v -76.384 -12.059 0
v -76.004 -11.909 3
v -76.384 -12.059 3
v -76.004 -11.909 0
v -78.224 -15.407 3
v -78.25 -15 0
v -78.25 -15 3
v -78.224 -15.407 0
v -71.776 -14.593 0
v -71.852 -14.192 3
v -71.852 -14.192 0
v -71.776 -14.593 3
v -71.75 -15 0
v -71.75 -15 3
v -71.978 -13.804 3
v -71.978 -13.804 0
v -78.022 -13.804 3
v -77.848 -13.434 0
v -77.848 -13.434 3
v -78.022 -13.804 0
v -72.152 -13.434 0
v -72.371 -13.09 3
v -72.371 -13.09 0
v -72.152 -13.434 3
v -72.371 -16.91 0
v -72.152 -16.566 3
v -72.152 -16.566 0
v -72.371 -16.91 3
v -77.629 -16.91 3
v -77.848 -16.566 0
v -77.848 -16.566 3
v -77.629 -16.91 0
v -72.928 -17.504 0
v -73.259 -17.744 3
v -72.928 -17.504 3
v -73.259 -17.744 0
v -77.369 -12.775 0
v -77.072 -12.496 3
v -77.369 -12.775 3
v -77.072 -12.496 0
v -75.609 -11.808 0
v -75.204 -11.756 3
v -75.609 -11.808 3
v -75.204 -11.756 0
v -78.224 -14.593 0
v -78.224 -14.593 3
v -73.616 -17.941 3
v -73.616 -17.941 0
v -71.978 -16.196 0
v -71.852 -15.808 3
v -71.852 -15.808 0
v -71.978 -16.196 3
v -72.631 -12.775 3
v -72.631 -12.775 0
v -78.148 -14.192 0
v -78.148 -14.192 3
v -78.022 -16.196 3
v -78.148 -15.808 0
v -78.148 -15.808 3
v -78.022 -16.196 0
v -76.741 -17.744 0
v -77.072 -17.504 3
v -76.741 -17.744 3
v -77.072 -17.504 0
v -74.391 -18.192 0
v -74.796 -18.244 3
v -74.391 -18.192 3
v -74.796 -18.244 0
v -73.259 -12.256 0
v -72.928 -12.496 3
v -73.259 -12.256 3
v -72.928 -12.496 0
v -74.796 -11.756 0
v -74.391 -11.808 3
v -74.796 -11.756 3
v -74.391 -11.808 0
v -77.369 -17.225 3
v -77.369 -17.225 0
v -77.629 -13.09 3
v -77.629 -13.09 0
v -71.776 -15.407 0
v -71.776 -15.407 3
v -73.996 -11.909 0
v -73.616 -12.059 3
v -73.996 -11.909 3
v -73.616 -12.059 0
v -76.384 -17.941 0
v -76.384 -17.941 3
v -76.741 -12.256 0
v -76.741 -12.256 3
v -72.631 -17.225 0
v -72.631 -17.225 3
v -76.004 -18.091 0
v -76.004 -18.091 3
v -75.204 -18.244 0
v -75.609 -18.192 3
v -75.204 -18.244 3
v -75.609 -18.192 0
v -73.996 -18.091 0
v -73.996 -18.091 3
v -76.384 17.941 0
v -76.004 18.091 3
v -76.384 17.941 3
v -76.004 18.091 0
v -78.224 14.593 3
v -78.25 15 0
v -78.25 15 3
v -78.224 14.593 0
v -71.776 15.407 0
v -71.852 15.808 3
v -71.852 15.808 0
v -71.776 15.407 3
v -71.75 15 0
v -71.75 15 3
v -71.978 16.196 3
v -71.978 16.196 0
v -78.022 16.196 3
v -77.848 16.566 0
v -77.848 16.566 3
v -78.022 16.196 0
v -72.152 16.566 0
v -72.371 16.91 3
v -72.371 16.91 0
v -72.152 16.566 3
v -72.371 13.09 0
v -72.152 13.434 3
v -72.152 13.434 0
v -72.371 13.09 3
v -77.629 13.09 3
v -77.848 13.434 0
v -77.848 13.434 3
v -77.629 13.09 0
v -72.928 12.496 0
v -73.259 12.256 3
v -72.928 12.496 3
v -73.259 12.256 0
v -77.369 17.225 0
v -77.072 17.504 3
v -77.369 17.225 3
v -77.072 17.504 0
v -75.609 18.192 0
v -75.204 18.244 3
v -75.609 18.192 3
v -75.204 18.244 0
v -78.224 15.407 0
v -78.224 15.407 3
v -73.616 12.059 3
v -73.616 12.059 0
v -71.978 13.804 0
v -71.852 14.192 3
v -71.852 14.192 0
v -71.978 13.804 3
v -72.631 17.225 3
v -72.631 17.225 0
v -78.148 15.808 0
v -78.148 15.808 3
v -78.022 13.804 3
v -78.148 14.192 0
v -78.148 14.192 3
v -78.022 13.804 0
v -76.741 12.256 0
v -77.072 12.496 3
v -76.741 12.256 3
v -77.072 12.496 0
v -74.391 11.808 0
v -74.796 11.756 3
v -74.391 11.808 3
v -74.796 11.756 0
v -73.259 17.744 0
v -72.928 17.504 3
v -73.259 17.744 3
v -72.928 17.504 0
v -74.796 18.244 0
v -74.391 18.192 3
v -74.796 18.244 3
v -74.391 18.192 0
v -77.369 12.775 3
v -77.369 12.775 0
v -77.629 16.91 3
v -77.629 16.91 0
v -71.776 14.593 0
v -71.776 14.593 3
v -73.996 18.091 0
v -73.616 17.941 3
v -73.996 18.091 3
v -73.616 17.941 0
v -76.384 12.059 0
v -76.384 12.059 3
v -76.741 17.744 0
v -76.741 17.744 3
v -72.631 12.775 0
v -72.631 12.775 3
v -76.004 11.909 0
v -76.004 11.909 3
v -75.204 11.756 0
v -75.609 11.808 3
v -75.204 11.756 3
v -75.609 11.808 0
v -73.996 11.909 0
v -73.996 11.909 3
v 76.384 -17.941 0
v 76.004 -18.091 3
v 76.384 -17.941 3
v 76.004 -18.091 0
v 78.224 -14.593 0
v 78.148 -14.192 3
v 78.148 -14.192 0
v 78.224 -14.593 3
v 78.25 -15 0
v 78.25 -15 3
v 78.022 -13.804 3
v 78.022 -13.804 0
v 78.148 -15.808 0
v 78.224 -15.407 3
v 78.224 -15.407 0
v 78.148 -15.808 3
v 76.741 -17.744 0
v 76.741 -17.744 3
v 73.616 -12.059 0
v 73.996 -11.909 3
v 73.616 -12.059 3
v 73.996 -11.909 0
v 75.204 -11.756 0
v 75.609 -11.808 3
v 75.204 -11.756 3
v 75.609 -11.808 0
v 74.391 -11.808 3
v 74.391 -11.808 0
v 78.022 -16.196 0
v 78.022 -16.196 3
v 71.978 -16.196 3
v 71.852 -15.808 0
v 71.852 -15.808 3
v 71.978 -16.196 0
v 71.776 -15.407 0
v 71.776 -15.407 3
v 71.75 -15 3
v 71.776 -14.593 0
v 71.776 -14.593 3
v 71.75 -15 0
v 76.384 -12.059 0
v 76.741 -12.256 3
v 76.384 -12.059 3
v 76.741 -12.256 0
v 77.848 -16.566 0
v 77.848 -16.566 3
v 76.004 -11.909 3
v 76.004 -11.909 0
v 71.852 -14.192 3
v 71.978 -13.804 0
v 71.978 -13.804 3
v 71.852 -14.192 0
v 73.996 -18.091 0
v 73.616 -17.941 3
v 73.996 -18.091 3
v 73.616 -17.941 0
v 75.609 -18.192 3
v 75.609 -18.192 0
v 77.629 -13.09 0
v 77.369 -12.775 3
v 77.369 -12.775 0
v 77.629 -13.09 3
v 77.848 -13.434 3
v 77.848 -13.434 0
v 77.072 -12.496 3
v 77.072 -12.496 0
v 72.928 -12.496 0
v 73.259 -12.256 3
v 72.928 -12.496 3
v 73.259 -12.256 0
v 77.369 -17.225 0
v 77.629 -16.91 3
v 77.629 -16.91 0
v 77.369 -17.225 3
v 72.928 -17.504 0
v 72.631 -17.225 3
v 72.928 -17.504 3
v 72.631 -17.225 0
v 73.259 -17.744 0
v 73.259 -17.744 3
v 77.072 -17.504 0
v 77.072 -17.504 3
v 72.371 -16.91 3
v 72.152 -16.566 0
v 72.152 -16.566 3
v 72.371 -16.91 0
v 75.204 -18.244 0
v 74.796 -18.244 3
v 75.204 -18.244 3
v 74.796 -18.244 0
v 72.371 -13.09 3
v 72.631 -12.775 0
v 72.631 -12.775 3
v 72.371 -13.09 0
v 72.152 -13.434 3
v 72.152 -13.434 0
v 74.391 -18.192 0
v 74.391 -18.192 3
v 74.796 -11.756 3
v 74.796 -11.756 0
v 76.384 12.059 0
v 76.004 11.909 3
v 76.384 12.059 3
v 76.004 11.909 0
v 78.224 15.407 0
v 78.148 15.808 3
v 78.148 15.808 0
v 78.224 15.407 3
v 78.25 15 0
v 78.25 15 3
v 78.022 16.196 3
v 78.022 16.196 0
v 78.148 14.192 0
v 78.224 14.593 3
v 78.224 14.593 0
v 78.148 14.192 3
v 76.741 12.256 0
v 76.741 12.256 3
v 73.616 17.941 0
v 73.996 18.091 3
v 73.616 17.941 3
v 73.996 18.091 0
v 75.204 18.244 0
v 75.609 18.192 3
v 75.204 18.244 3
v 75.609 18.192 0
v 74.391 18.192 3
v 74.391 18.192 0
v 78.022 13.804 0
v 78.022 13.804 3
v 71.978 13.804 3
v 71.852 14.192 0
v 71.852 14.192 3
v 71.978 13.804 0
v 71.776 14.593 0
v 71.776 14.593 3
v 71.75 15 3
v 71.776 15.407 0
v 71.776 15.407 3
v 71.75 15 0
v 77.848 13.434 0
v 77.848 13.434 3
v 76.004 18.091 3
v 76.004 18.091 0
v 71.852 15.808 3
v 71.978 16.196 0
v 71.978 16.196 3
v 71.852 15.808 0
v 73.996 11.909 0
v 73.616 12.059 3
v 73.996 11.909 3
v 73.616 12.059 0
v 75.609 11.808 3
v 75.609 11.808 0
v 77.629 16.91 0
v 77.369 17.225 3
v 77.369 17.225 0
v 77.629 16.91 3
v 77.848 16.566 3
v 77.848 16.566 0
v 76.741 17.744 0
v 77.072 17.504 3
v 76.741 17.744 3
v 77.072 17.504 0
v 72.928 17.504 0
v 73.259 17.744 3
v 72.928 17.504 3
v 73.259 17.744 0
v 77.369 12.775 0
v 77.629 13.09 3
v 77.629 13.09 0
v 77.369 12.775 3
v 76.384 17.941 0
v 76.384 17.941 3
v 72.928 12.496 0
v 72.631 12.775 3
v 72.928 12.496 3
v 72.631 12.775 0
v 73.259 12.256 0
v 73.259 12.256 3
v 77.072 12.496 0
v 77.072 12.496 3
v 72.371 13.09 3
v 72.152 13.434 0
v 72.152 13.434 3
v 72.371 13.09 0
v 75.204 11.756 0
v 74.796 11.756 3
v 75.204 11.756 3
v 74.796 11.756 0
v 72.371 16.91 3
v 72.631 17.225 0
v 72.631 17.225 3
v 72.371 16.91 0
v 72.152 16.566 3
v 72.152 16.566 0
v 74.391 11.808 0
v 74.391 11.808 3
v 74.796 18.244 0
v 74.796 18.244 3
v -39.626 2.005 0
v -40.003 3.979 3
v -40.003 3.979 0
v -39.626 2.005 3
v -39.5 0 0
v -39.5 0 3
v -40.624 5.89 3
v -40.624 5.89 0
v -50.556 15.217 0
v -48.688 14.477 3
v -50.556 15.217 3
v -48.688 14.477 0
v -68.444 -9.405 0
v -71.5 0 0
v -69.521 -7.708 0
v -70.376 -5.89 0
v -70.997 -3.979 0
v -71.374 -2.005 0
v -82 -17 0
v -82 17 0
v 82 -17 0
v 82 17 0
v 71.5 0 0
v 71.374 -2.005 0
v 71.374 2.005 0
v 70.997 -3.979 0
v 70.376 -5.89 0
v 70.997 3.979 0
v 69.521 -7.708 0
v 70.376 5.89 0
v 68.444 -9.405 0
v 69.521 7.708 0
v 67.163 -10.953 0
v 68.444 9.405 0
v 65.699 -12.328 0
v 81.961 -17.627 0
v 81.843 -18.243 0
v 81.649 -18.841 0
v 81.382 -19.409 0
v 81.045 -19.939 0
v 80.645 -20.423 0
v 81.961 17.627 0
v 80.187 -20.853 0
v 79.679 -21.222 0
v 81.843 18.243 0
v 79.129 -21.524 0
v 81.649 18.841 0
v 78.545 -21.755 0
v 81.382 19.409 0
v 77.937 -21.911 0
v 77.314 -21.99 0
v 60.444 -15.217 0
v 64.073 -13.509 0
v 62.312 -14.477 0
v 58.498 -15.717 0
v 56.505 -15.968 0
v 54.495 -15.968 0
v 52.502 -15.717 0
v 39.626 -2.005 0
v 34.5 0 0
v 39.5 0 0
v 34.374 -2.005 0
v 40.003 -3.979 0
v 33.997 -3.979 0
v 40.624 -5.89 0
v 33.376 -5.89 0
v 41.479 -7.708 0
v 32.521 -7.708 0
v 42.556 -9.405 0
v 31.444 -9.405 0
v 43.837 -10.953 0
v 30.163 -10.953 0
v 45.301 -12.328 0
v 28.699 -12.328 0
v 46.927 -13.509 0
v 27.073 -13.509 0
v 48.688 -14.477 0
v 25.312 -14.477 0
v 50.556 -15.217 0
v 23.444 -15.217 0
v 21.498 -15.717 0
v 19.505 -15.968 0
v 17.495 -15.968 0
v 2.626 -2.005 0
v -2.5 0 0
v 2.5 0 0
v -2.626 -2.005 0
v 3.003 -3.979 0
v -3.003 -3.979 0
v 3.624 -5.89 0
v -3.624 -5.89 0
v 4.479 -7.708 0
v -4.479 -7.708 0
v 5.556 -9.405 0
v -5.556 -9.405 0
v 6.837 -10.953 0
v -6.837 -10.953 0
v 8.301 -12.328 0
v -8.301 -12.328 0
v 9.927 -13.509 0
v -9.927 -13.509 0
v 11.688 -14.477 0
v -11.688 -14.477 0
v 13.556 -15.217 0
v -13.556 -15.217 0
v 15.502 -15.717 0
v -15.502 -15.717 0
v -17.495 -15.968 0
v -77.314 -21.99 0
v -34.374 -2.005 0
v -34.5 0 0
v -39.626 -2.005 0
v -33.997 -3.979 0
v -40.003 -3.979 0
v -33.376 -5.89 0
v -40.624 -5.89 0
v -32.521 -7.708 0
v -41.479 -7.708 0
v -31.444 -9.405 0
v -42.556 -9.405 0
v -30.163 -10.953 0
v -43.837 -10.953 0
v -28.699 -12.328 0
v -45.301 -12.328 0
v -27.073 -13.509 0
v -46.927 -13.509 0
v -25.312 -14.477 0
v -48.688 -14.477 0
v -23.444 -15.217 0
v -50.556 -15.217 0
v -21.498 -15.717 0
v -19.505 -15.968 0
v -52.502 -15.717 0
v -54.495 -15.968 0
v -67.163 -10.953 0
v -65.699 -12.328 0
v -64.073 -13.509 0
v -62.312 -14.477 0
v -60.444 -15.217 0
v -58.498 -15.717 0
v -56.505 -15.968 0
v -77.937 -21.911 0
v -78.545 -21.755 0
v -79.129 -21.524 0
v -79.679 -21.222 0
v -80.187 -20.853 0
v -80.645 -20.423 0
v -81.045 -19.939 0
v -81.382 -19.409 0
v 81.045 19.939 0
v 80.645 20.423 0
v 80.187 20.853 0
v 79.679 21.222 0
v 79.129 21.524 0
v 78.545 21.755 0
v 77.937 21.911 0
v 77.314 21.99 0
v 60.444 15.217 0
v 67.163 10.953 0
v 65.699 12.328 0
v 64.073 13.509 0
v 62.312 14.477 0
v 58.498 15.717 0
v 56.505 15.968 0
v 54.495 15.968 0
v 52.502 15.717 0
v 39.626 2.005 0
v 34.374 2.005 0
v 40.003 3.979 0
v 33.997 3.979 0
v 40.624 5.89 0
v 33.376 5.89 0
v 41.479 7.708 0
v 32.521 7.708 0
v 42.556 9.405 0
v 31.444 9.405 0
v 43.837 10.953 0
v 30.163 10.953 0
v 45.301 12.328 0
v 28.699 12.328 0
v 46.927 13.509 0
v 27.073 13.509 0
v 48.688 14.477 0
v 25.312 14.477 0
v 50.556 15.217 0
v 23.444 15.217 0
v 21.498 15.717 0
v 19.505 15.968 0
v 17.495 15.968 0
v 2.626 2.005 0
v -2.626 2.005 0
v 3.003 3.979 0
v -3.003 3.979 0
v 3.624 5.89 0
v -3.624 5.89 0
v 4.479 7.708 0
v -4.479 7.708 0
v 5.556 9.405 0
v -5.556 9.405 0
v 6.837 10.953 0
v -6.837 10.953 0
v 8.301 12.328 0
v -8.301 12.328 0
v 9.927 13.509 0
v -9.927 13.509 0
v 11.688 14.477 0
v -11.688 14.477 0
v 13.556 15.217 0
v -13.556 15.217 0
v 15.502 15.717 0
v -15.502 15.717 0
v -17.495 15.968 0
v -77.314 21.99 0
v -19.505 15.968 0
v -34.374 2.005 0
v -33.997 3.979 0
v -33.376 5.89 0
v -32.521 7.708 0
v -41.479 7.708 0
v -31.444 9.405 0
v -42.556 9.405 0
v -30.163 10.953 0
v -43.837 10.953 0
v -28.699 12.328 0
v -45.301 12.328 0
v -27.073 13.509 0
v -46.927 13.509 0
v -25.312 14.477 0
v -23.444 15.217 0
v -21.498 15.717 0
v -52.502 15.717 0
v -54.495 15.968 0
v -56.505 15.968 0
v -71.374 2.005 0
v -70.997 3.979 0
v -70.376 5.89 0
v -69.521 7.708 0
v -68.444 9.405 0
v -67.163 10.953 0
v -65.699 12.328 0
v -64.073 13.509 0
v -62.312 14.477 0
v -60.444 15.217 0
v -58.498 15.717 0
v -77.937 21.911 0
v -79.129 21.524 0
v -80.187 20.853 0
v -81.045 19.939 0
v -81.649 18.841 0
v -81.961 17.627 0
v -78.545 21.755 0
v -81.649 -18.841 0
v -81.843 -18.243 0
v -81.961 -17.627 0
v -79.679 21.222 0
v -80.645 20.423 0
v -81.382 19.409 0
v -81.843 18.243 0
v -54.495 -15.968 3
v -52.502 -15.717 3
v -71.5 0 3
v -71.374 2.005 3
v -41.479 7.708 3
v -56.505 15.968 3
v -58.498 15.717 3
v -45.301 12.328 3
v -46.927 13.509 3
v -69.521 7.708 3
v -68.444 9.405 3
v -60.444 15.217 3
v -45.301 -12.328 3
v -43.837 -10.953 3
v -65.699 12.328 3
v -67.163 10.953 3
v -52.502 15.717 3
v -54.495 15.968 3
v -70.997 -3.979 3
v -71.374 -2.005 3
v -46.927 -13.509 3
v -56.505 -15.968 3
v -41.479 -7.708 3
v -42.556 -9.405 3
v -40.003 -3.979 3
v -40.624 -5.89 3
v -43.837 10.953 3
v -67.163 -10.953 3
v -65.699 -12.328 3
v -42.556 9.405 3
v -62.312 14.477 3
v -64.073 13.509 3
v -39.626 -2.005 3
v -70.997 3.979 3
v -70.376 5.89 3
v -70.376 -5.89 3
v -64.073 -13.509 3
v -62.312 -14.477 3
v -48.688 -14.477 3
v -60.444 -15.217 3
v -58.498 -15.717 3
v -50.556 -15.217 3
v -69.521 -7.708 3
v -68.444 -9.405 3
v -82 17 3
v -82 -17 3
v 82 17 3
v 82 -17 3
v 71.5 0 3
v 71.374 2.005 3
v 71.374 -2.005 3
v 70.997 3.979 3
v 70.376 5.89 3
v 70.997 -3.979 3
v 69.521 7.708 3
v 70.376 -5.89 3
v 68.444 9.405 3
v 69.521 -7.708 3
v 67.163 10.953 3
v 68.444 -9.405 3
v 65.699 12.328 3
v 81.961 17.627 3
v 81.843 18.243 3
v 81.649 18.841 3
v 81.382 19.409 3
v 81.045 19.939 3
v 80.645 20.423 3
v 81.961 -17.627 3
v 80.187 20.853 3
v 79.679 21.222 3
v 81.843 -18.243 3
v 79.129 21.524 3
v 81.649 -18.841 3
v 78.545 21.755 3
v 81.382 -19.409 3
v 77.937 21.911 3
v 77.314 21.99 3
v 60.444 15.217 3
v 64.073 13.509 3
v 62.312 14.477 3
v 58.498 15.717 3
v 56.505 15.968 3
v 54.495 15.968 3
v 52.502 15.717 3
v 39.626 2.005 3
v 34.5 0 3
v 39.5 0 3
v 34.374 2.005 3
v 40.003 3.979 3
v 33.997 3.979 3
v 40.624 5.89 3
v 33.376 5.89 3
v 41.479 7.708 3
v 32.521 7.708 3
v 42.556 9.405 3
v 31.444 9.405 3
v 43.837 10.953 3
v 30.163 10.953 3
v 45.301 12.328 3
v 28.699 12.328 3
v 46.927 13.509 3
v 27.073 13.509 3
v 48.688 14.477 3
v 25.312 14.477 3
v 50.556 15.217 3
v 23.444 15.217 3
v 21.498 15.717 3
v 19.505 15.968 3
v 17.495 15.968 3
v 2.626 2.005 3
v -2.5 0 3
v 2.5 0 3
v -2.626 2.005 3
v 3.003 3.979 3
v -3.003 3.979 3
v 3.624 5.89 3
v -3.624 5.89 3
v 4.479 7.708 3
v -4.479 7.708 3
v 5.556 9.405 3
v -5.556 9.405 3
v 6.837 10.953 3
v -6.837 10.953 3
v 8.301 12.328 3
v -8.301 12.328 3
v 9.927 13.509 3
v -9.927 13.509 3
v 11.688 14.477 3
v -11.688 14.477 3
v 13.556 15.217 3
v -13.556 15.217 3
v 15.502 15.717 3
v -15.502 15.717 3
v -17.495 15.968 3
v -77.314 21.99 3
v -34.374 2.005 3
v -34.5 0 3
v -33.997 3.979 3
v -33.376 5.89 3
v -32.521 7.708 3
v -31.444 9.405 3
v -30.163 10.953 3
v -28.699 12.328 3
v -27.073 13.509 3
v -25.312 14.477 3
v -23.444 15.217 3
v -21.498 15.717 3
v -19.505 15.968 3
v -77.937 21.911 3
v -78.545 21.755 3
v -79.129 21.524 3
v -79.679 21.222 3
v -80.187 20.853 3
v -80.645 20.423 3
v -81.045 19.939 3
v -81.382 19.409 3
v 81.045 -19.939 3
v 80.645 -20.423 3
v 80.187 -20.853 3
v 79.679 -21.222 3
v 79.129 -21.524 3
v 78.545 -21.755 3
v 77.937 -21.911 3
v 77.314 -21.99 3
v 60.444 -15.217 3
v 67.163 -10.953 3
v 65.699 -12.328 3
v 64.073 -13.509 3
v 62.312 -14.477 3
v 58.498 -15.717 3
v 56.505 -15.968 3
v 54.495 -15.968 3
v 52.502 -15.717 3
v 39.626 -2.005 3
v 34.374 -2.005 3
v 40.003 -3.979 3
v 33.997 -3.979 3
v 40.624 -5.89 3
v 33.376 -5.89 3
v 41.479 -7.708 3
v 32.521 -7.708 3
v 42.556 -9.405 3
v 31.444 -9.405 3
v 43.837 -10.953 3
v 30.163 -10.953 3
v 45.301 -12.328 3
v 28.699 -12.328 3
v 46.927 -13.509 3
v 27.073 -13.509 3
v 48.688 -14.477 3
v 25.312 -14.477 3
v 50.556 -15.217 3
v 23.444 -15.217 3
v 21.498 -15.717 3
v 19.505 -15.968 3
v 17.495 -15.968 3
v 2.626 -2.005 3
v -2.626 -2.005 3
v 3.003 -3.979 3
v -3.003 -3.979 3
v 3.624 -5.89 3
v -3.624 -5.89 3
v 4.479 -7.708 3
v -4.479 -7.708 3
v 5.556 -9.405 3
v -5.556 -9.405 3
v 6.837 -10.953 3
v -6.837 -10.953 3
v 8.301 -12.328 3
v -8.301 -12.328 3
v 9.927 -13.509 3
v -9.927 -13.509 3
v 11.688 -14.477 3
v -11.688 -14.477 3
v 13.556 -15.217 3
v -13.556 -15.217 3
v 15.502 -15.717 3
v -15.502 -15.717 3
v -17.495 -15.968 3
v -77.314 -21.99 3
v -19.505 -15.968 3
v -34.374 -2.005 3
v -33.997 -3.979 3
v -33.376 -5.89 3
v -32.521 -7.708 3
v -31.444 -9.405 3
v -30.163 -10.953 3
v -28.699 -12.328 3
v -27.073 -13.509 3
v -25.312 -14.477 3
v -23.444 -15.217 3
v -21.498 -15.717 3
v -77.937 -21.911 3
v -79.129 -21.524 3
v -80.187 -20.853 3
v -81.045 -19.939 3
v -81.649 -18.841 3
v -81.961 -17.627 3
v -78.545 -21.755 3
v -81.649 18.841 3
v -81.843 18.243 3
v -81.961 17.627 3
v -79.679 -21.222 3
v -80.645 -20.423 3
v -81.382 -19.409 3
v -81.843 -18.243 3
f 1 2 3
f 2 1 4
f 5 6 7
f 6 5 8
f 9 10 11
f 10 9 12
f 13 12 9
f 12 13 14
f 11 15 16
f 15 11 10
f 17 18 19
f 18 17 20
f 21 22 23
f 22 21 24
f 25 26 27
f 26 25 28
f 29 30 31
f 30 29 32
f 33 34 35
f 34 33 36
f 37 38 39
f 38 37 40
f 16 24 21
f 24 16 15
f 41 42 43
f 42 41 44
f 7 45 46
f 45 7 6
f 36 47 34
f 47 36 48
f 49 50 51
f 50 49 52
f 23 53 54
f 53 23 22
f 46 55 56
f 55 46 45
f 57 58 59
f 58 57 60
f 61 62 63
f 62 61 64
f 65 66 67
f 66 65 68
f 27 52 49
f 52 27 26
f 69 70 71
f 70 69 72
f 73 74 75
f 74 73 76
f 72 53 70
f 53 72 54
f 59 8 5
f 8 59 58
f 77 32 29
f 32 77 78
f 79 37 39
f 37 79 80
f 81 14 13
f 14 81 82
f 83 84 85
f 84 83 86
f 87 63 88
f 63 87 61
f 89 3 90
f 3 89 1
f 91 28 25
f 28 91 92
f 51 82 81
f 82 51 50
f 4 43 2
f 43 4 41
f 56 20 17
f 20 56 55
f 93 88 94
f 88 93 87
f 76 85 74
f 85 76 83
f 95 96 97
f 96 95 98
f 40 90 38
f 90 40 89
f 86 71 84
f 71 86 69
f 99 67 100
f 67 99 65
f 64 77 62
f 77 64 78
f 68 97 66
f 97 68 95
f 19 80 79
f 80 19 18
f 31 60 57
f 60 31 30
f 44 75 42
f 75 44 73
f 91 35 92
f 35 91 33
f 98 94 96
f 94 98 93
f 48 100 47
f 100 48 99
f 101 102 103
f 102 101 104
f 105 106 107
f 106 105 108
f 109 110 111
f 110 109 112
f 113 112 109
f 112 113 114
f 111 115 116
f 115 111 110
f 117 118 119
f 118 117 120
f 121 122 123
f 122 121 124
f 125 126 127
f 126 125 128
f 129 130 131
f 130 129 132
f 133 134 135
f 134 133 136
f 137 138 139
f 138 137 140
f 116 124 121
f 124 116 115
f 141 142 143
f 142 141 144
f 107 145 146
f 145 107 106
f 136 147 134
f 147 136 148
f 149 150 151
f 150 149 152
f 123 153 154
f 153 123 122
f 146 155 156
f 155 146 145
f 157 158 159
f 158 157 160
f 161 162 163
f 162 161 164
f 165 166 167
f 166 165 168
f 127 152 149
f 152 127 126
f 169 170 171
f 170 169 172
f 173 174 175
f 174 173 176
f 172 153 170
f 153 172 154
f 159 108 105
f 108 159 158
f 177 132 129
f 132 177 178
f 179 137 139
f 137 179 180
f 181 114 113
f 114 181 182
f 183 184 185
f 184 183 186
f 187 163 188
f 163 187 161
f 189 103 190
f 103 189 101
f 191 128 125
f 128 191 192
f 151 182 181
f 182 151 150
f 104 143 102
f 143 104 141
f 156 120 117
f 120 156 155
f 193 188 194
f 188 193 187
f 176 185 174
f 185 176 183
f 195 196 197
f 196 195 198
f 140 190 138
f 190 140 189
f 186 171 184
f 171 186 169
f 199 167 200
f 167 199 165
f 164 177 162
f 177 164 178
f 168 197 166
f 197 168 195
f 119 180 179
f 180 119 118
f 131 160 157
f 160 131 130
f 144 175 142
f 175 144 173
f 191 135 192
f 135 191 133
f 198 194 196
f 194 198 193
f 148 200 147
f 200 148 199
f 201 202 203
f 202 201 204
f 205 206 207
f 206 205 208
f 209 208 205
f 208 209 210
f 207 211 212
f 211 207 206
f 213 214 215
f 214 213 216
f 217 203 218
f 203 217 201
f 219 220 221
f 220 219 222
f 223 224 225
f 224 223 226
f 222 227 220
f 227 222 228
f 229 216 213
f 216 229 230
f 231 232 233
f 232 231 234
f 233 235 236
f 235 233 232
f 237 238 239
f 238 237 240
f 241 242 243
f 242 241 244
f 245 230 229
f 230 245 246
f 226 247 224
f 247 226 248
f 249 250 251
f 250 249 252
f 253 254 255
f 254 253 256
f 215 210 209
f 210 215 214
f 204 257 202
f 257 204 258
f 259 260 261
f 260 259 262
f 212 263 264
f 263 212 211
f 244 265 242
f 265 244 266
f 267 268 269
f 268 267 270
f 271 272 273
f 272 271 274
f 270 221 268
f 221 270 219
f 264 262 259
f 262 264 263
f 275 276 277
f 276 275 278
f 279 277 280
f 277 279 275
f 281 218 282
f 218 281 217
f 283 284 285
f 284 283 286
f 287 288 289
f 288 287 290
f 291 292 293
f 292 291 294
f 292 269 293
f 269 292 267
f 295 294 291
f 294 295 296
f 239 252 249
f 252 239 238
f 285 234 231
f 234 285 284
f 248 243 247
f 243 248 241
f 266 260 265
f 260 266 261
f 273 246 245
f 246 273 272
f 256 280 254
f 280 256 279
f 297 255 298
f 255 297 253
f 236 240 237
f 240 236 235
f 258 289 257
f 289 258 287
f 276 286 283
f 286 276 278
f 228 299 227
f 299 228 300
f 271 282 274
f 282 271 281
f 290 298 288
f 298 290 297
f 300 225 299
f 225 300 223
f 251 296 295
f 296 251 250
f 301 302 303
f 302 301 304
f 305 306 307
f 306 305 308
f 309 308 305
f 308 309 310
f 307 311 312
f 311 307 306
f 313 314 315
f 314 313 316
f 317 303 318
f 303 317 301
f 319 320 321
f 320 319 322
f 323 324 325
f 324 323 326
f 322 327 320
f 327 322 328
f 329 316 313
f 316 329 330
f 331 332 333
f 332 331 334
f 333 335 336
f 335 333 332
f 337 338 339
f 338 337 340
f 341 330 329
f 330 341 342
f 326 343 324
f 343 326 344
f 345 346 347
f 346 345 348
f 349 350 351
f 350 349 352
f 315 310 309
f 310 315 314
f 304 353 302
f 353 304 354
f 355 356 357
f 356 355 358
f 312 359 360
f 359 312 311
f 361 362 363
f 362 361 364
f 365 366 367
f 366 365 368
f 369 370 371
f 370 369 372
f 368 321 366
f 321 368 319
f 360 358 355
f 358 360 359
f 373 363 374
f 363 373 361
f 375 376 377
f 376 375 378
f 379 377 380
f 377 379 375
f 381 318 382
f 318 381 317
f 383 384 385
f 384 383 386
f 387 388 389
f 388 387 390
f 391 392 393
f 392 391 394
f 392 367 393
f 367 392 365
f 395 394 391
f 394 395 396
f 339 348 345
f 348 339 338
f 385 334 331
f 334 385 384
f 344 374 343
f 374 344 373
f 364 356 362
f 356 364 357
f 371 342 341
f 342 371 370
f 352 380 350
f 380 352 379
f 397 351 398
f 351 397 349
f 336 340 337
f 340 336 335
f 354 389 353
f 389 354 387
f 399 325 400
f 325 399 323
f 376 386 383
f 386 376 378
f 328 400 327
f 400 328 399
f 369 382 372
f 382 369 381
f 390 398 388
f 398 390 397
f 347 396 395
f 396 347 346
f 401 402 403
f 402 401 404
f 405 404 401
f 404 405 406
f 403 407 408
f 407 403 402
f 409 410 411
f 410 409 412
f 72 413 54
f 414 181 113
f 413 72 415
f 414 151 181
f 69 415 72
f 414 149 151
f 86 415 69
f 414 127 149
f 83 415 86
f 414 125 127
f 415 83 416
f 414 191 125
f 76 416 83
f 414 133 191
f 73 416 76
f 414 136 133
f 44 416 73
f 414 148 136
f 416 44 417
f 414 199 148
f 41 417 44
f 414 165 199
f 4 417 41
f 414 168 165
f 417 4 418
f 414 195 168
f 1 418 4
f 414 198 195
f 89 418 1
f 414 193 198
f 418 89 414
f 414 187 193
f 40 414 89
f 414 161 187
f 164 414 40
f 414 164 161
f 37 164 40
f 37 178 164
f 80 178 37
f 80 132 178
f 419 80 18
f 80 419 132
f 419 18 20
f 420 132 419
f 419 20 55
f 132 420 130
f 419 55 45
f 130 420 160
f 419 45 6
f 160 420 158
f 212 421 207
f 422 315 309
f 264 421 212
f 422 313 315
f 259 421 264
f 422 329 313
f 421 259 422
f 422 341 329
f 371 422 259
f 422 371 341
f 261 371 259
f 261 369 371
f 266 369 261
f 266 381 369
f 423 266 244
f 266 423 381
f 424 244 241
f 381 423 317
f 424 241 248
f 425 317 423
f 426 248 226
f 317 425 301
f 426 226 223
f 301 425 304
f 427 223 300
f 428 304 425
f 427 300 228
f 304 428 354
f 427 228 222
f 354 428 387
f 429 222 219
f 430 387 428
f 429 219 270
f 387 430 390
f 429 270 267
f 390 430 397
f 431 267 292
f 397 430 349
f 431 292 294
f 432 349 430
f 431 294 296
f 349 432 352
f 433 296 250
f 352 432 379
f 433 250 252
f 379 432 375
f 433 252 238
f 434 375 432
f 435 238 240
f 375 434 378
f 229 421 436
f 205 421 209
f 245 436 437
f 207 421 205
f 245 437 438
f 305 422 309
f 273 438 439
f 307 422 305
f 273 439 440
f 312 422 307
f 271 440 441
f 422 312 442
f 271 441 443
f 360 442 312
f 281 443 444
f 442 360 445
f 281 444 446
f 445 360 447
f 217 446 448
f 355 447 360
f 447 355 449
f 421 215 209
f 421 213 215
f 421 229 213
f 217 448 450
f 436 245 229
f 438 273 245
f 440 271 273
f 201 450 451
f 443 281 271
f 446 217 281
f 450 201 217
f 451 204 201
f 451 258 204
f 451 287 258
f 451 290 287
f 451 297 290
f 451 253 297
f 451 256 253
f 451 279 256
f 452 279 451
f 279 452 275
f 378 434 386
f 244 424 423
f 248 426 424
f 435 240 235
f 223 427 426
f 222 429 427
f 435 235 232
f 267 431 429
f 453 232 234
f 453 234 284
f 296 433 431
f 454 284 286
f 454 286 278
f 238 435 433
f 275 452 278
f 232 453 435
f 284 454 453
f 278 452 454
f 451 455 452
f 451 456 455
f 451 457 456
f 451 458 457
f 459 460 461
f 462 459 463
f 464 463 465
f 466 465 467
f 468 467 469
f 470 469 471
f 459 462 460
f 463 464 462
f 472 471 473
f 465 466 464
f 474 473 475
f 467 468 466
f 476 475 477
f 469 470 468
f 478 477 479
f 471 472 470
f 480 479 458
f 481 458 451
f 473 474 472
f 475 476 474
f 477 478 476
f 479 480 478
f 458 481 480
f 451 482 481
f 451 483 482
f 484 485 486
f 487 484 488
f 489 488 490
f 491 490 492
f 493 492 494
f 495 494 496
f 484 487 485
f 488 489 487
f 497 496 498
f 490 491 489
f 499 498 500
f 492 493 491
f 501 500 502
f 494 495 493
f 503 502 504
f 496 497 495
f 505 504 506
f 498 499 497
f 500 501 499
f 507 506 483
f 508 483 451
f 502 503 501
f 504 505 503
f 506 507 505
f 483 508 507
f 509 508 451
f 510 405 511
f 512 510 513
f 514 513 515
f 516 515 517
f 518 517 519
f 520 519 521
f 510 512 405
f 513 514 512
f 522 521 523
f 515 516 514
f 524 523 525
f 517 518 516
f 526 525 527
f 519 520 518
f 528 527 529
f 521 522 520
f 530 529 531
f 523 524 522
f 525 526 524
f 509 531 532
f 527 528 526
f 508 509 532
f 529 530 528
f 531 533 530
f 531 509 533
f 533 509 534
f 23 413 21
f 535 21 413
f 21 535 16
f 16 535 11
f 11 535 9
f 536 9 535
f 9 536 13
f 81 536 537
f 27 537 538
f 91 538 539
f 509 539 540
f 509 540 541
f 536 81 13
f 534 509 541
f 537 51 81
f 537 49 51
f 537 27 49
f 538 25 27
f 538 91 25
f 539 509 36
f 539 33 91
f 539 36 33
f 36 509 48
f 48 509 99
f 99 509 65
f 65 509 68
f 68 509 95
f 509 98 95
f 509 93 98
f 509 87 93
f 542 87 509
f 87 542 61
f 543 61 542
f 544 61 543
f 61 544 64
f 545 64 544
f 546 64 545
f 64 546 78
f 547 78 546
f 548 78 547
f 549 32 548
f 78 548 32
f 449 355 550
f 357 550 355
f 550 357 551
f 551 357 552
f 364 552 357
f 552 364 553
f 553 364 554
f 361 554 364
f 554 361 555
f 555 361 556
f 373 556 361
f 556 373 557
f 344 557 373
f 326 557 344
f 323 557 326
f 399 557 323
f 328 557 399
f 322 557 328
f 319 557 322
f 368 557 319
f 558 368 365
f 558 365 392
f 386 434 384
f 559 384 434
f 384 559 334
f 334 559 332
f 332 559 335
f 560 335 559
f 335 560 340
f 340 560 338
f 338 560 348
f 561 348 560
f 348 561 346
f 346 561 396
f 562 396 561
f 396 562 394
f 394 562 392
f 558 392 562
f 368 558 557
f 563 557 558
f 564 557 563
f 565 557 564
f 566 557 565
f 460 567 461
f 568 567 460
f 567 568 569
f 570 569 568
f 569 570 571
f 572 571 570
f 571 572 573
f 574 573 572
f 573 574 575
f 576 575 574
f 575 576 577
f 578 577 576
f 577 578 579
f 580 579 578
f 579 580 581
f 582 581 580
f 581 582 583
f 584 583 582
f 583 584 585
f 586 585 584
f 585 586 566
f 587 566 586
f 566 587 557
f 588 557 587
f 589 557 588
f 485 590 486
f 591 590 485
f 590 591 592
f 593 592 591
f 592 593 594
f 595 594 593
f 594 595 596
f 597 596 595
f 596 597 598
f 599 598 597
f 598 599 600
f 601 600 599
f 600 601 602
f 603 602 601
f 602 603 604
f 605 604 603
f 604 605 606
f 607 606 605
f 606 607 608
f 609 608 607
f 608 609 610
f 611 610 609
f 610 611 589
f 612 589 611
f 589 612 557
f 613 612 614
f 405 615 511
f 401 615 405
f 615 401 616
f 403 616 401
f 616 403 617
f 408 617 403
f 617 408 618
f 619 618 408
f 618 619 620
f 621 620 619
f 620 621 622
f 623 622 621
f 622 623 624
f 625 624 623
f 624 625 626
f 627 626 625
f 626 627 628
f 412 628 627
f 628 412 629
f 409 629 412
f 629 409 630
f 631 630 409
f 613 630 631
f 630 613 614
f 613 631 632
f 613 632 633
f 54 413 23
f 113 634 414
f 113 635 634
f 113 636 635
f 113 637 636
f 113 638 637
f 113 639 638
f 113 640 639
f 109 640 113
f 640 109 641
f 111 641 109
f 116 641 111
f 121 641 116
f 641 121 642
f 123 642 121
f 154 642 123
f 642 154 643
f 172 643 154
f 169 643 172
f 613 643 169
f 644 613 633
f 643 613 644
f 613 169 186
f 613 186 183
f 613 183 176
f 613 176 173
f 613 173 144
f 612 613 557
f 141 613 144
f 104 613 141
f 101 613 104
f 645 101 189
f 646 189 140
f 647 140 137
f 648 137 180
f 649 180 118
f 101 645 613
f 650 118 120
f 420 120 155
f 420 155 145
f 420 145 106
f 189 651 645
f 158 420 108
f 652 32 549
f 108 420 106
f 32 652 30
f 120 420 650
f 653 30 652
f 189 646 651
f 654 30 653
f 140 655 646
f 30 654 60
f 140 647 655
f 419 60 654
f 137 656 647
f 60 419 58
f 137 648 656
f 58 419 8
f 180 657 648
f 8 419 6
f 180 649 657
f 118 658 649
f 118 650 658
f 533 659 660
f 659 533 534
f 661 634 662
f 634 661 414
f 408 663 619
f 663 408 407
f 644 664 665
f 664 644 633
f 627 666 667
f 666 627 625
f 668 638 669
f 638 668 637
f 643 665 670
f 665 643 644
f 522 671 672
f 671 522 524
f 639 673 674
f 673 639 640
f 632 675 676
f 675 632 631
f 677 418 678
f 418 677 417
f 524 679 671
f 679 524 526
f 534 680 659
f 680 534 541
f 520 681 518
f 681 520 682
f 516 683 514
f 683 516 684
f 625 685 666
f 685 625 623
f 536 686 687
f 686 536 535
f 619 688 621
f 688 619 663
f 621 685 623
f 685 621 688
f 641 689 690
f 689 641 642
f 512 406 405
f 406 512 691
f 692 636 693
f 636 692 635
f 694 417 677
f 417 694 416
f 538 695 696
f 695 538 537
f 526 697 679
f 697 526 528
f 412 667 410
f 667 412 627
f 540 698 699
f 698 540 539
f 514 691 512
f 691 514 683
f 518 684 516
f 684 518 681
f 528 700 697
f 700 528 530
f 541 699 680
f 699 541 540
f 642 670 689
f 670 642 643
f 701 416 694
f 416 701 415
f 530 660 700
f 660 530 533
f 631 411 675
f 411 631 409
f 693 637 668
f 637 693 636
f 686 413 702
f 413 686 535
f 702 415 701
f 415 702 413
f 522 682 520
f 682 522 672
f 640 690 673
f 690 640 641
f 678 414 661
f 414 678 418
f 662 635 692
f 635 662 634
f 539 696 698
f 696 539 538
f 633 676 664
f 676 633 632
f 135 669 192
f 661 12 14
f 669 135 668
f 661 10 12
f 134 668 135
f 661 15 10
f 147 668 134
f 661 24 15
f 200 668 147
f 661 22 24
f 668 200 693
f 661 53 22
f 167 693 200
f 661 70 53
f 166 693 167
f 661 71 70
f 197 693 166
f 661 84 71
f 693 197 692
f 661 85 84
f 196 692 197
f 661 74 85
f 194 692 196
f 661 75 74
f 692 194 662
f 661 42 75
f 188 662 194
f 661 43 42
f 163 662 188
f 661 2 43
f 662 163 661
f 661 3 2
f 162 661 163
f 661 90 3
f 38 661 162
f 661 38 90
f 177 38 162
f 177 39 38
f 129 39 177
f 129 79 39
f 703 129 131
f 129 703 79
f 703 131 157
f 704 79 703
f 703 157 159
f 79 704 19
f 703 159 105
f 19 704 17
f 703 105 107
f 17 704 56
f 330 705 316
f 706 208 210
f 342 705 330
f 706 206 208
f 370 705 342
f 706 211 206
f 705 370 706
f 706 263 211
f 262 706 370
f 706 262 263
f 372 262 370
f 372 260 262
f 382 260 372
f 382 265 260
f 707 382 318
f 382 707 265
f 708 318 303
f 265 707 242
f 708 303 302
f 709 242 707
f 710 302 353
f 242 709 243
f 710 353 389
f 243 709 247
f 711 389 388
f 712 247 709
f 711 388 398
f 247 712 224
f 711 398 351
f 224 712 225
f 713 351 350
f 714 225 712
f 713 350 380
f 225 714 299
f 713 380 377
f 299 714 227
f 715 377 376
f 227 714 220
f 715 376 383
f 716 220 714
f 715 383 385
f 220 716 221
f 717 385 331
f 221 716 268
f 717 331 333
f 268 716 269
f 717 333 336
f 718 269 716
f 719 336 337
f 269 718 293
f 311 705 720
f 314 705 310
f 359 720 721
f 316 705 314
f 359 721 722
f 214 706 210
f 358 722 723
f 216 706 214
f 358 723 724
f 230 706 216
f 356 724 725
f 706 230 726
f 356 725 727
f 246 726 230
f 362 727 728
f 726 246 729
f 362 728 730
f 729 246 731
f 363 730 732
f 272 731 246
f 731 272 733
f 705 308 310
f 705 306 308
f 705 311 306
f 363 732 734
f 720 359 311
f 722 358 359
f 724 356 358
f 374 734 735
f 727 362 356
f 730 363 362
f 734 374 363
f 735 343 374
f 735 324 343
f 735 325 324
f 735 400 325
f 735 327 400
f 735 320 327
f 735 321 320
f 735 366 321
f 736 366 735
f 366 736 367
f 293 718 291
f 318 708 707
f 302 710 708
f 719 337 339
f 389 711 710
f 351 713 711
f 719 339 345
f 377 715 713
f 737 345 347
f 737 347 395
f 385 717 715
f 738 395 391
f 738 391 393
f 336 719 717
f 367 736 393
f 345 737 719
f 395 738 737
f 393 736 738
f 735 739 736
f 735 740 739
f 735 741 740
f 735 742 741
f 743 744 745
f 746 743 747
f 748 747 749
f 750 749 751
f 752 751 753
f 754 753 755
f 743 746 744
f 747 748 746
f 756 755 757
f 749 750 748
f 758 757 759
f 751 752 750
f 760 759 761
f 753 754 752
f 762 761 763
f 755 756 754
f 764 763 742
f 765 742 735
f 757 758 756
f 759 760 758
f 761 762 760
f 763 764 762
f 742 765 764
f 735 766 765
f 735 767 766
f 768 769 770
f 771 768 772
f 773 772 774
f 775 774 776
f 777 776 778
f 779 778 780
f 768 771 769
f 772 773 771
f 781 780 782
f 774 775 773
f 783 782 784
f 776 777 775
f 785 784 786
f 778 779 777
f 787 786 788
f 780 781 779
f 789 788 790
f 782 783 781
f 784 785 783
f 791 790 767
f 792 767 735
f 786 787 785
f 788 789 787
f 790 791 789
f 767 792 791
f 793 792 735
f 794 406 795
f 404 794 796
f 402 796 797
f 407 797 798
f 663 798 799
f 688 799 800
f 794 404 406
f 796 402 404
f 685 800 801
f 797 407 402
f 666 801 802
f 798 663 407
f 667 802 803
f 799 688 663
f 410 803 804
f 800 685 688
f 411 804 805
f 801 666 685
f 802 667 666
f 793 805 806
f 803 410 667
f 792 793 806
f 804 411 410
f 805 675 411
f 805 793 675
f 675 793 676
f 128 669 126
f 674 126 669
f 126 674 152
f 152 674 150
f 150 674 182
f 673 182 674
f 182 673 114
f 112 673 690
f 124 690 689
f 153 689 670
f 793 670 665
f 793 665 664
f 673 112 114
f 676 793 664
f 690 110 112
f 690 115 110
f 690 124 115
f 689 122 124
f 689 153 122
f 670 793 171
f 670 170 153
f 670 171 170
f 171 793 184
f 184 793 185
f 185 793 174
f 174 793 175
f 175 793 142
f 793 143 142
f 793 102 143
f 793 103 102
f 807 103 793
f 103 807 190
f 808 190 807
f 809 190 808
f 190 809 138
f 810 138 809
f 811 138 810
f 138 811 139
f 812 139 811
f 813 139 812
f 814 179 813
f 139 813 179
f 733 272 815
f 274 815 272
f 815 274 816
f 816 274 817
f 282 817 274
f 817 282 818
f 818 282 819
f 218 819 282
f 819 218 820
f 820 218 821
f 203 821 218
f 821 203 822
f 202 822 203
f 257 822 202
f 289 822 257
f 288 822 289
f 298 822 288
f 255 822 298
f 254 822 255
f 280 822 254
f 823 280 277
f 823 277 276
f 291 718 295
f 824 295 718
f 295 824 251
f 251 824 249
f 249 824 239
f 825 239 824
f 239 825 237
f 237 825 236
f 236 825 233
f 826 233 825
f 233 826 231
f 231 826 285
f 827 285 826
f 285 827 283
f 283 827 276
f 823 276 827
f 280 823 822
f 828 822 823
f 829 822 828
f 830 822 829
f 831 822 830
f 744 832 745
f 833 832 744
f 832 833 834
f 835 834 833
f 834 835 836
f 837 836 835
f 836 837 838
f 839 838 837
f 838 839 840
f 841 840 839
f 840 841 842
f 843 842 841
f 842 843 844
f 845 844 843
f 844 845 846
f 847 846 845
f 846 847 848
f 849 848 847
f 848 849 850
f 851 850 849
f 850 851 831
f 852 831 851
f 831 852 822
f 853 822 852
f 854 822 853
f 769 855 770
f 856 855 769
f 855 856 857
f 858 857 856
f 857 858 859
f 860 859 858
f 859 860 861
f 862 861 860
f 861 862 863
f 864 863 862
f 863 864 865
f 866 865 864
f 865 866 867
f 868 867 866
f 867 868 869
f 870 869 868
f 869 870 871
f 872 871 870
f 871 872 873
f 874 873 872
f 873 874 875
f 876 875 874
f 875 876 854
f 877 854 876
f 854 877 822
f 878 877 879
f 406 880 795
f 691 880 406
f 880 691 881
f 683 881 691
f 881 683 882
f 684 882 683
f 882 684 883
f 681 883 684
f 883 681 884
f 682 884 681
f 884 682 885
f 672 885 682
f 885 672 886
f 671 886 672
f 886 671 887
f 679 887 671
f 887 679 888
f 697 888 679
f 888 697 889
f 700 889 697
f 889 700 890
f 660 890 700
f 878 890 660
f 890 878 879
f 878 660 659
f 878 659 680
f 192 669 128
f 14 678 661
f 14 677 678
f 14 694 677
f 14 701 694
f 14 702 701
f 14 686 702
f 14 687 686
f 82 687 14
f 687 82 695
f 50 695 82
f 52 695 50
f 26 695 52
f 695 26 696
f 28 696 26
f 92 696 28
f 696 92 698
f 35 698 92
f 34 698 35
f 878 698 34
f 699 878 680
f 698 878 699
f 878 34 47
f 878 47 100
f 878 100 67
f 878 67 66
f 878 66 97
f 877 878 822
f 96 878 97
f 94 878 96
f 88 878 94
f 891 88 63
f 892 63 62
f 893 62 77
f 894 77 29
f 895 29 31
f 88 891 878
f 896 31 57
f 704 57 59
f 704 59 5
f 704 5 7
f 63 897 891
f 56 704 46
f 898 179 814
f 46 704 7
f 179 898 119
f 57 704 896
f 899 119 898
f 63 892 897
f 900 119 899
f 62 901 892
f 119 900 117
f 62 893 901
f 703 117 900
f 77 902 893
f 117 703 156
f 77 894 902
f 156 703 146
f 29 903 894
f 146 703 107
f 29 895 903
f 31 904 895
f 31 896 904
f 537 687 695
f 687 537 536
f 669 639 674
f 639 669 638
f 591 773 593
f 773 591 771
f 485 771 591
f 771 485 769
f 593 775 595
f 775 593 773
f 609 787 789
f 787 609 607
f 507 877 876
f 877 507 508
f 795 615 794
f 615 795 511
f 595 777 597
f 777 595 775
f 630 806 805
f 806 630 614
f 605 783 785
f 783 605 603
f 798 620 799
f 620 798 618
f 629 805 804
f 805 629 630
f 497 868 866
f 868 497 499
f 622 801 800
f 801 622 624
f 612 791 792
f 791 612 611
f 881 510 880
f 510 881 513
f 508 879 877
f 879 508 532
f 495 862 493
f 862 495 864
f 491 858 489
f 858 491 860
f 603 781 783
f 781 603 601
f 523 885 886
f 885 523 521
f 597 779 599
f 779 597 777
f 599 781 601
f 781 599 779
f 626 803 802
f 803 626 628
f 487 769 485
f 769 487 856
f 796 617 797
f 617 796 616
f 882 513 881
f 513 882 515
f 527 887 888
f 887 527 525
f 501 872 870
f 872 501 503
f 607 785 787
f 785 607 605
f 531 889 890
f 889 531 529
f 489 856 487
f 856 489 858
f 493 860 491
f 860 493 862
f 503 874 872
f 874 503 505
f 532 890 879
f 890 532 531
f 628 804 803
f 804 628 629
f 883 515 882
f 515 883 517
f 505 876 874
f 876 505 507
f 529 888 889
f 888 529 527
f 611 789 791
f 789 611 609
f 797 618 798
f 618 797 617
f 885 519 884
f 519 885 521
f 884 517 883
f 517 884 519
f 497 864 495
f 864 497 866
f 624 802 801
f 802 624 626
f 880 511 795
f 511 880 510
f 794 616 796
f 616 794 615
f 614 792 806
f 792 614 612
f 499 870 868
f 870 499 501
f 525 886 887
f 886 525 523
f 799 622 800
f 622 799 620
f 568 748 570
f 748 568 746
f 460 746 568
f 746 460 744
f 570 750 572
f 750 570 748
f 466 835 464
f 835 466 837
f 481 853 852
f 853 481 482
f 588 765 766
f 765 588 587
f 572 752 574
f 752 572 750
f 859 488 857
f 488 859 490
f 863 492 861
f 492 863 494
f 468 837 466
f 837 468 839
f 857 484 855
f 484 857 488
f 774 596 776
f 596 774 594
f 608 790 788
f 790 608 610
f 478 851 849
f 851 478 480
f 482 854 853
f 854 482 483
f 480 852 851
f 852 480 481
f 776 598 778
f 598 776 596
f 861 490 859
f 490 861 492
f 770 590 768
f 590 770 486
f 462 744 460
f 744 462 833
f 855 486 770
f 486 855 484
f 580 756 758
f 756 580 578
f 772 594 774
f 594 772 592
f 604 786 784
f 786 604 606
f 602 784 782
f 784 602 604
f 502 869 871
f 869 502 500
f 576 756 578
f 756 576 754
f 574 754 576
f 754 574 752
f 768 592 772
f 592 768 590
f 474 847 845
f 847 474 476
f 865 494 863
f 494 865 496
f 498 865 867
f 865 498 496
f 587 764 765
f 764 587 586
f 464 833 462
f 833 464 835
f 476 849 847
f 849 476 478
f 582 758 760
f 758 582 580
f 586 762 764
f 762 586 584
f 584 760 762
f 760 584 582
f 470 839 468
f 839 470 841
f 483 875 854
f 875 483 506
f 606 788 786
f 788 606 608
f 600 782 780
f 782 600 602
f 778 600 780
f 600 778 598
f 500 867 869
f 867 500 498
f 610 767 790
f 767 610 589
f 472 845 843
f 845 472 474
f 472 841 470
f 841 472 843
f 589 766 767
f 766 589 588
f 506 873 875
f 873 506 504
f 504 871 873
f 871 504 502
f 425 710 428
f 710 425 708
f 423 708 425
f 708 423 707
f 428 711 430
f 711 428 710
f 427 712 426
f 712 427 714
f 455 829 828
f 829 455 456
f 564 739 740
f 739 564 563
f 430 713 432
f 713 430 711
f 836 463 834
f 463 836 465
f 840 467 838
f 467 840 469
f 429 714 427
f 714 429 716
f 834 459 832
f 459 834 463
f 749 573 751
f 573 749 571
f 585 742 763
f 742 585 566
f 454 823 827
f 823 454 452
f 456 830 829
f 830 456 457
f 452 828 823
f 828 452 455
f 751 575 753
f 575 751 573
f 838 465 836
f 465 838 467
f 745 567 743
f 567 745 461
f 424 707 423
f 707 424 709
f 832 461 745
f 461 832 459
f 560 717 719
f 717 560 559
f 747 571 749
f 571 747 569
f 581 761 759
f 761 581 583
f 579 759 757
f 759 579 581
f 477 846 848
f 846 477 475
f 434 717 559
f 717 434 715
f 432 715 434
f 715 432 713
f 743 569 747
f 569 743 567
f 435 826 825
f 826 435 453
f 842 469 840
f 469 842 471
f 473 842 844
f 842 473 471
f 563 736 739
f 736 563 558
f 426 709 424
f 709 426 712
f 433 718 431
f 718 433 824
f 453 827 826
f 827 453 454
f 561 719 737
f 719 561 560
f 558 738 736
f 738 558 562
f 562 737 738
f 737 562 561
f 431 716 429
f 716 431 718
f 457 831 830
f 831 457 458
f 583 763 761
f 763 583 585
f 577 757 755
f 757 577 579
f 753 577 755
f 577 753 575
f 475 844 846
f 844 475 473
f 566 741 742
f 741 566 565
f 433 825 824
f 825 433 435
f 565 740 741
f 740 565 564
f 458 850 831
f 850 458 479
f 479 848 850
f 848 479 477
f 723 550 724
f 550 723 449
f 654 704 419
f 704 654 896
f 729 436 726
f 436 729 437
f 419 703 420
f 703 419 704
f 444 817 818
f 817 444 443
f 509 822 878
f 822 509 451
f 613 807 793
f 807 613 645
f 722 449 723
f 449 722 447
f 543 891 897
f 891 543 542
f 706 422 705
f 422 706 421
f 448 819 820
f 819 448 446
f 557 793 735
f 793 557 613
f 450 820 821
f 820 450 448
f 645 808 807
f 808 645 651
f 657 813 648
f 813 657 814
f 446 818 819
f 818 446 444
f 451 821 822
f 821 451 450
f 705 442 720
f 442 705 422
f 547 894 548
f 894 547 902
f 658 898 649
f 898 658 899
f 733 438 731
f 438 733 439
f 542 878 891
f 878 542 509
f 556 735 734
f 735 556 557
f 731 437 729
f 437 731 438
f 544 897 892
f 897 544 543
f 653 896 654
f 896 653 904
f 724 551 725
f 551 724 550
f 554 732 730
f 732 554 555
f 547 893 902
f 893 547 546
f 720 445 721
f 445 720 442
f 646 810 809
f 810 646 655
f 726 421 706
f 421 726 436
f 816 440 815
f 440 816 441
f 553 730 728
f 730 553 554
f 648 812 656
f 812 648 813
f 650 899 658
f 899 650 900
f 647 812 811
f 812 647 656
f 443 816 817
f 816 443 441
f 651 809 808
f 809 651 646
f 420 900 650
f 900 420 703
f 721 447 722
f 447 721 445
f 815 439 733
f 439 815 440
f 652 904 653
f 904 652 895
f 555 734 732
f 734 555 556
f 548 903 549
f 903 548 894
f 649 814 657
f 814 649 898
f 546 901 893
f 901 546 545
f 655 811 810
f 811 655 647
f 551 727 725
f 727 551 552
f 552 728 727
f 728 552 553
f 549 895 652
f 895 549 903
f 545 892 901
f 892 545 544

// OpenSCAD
$fn = 50;


difference() {
	union() {
		hull() {
			translate(v = [-77.0000000000, 17.0000000000, 0]) {
				cylinder(h = 3, r = 5);
			}
			translate(v = [77.0000000000, 17.0000000000, 0]) {
				cylinder(h = 3, r = 5);
			}
			translate(v = [-77.0000000000, -17.0000000000, 0]) {
				cylinder(h = 3, r = 5);
			}
			translate(v = [77.0000000000, -17.0000000000, 0]) {
				cylinder(h = 3, r = 5);
			}
		}
	}
	union() {
		#translate(v = [-75.0000000000, -15.0000000000, -100.0000000000]) {
			cylinder(h = 200, r = 3.2500000000);
		}
		#translate(v = [-75.0000000000, 15.0000000000, -100.0000000000]) {
			cylinder(h = 200, r = 3.2500000000);
		}
		#translate(v = [75.0000000000, -15.0000000000, -100.0000000000]) {
			cylinder(h = 200, r = 3.2500000000);
		}
		#translate(v = [75.0000000000, 15.0000000000, -100.0000000000]) {
			cylinder(h = 200, r = 3.2500000000);
		}
		#translate(v = [-55.5000000000, 0, 0]) {
			cylinder(h = 3, r = 16.0000000000);
		}
		#translate(v = [-18.5000000000, 0, 0]) {
			cylinder(h = 3, r = 16.0000000000);
		}
		#translate(v = [18.5000000000, 0, 0]) {
			cylinder(h = 3, r = 16.0000000000);
		}
		#translate(v = [55.5000000000, 0, 0]) {
			cylinder(h = 3, r = 16.0000000000);
		}
	}
}
